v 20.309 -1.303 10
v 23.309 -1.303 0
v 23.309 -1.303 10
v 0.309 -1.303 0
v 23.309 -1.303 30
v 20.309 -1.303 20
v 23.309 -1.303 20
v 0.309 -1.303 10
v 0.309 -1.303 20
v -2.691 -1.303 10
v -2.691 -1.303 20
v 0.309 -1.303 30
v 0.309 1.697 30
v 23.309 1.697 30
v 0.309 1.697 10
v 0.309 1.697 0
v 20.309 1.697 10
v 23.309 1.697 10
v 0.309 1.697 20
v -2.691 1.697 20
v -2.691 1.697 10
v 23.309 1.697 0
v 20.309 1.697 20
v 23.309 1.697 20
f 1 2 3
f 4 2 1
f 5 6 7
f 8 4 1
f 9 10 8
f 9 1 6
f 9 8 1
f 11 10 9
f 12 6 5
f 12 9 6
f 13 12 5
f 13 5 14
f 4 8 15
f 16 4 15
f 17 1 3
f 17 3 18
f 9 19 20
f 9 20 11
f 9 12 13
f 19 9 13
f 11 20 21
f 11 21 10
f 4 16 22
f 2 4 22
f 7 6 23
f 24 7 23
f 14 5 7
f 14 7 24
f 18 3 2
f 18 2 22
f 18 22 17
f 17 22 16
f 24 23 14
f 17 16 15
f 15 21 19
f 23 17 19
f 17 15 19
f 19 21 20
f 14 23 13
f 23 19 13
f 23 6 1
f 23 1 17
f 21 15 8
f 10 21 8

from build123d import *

# Parameters (mm, degrees)
F0_W     = 20
F0_H     = 3
F1_DEPTH = 30
F2_W     = 3
F2_H     = 10
F3_DEPTH = 3
F4_W     = 3
F4_H     = 10
F5_DEPTH = 3


with BuildPart() as f1:
    # F0 (on Top) → F1 (new body)
    with BuildSketch(Plane.XY):
        with Locations((10.308956, 0.197368)):
            Rectangle(F0_W, F0_H)
    extrude(amount=F1_DEPTH)

    # F2 (on face) → F3 (join)
    with BuildSketch(Plane.YZ.offset(20.308956)):
        with Locations((0.197368, 25)):
            Rectangle(F2_W, F2_H)
        with Locations((0.197368, 5)):
            Rectangle(F2_W, F2_H)
    extrude(amount=F3_DEPTH)

    # F4 (on face) → F5 (join)
    with BuildSketch(Plane(origin=(0.308956, 0, 0), x_dir=(0, -1, 0), z_dir=(-1, 0, 0))):
        with Locations((-0.197368, 15)):
            Rectangle(F4_W, F4_H)
    extrude(amount=F5_DEPTH)


solid = f1.part
